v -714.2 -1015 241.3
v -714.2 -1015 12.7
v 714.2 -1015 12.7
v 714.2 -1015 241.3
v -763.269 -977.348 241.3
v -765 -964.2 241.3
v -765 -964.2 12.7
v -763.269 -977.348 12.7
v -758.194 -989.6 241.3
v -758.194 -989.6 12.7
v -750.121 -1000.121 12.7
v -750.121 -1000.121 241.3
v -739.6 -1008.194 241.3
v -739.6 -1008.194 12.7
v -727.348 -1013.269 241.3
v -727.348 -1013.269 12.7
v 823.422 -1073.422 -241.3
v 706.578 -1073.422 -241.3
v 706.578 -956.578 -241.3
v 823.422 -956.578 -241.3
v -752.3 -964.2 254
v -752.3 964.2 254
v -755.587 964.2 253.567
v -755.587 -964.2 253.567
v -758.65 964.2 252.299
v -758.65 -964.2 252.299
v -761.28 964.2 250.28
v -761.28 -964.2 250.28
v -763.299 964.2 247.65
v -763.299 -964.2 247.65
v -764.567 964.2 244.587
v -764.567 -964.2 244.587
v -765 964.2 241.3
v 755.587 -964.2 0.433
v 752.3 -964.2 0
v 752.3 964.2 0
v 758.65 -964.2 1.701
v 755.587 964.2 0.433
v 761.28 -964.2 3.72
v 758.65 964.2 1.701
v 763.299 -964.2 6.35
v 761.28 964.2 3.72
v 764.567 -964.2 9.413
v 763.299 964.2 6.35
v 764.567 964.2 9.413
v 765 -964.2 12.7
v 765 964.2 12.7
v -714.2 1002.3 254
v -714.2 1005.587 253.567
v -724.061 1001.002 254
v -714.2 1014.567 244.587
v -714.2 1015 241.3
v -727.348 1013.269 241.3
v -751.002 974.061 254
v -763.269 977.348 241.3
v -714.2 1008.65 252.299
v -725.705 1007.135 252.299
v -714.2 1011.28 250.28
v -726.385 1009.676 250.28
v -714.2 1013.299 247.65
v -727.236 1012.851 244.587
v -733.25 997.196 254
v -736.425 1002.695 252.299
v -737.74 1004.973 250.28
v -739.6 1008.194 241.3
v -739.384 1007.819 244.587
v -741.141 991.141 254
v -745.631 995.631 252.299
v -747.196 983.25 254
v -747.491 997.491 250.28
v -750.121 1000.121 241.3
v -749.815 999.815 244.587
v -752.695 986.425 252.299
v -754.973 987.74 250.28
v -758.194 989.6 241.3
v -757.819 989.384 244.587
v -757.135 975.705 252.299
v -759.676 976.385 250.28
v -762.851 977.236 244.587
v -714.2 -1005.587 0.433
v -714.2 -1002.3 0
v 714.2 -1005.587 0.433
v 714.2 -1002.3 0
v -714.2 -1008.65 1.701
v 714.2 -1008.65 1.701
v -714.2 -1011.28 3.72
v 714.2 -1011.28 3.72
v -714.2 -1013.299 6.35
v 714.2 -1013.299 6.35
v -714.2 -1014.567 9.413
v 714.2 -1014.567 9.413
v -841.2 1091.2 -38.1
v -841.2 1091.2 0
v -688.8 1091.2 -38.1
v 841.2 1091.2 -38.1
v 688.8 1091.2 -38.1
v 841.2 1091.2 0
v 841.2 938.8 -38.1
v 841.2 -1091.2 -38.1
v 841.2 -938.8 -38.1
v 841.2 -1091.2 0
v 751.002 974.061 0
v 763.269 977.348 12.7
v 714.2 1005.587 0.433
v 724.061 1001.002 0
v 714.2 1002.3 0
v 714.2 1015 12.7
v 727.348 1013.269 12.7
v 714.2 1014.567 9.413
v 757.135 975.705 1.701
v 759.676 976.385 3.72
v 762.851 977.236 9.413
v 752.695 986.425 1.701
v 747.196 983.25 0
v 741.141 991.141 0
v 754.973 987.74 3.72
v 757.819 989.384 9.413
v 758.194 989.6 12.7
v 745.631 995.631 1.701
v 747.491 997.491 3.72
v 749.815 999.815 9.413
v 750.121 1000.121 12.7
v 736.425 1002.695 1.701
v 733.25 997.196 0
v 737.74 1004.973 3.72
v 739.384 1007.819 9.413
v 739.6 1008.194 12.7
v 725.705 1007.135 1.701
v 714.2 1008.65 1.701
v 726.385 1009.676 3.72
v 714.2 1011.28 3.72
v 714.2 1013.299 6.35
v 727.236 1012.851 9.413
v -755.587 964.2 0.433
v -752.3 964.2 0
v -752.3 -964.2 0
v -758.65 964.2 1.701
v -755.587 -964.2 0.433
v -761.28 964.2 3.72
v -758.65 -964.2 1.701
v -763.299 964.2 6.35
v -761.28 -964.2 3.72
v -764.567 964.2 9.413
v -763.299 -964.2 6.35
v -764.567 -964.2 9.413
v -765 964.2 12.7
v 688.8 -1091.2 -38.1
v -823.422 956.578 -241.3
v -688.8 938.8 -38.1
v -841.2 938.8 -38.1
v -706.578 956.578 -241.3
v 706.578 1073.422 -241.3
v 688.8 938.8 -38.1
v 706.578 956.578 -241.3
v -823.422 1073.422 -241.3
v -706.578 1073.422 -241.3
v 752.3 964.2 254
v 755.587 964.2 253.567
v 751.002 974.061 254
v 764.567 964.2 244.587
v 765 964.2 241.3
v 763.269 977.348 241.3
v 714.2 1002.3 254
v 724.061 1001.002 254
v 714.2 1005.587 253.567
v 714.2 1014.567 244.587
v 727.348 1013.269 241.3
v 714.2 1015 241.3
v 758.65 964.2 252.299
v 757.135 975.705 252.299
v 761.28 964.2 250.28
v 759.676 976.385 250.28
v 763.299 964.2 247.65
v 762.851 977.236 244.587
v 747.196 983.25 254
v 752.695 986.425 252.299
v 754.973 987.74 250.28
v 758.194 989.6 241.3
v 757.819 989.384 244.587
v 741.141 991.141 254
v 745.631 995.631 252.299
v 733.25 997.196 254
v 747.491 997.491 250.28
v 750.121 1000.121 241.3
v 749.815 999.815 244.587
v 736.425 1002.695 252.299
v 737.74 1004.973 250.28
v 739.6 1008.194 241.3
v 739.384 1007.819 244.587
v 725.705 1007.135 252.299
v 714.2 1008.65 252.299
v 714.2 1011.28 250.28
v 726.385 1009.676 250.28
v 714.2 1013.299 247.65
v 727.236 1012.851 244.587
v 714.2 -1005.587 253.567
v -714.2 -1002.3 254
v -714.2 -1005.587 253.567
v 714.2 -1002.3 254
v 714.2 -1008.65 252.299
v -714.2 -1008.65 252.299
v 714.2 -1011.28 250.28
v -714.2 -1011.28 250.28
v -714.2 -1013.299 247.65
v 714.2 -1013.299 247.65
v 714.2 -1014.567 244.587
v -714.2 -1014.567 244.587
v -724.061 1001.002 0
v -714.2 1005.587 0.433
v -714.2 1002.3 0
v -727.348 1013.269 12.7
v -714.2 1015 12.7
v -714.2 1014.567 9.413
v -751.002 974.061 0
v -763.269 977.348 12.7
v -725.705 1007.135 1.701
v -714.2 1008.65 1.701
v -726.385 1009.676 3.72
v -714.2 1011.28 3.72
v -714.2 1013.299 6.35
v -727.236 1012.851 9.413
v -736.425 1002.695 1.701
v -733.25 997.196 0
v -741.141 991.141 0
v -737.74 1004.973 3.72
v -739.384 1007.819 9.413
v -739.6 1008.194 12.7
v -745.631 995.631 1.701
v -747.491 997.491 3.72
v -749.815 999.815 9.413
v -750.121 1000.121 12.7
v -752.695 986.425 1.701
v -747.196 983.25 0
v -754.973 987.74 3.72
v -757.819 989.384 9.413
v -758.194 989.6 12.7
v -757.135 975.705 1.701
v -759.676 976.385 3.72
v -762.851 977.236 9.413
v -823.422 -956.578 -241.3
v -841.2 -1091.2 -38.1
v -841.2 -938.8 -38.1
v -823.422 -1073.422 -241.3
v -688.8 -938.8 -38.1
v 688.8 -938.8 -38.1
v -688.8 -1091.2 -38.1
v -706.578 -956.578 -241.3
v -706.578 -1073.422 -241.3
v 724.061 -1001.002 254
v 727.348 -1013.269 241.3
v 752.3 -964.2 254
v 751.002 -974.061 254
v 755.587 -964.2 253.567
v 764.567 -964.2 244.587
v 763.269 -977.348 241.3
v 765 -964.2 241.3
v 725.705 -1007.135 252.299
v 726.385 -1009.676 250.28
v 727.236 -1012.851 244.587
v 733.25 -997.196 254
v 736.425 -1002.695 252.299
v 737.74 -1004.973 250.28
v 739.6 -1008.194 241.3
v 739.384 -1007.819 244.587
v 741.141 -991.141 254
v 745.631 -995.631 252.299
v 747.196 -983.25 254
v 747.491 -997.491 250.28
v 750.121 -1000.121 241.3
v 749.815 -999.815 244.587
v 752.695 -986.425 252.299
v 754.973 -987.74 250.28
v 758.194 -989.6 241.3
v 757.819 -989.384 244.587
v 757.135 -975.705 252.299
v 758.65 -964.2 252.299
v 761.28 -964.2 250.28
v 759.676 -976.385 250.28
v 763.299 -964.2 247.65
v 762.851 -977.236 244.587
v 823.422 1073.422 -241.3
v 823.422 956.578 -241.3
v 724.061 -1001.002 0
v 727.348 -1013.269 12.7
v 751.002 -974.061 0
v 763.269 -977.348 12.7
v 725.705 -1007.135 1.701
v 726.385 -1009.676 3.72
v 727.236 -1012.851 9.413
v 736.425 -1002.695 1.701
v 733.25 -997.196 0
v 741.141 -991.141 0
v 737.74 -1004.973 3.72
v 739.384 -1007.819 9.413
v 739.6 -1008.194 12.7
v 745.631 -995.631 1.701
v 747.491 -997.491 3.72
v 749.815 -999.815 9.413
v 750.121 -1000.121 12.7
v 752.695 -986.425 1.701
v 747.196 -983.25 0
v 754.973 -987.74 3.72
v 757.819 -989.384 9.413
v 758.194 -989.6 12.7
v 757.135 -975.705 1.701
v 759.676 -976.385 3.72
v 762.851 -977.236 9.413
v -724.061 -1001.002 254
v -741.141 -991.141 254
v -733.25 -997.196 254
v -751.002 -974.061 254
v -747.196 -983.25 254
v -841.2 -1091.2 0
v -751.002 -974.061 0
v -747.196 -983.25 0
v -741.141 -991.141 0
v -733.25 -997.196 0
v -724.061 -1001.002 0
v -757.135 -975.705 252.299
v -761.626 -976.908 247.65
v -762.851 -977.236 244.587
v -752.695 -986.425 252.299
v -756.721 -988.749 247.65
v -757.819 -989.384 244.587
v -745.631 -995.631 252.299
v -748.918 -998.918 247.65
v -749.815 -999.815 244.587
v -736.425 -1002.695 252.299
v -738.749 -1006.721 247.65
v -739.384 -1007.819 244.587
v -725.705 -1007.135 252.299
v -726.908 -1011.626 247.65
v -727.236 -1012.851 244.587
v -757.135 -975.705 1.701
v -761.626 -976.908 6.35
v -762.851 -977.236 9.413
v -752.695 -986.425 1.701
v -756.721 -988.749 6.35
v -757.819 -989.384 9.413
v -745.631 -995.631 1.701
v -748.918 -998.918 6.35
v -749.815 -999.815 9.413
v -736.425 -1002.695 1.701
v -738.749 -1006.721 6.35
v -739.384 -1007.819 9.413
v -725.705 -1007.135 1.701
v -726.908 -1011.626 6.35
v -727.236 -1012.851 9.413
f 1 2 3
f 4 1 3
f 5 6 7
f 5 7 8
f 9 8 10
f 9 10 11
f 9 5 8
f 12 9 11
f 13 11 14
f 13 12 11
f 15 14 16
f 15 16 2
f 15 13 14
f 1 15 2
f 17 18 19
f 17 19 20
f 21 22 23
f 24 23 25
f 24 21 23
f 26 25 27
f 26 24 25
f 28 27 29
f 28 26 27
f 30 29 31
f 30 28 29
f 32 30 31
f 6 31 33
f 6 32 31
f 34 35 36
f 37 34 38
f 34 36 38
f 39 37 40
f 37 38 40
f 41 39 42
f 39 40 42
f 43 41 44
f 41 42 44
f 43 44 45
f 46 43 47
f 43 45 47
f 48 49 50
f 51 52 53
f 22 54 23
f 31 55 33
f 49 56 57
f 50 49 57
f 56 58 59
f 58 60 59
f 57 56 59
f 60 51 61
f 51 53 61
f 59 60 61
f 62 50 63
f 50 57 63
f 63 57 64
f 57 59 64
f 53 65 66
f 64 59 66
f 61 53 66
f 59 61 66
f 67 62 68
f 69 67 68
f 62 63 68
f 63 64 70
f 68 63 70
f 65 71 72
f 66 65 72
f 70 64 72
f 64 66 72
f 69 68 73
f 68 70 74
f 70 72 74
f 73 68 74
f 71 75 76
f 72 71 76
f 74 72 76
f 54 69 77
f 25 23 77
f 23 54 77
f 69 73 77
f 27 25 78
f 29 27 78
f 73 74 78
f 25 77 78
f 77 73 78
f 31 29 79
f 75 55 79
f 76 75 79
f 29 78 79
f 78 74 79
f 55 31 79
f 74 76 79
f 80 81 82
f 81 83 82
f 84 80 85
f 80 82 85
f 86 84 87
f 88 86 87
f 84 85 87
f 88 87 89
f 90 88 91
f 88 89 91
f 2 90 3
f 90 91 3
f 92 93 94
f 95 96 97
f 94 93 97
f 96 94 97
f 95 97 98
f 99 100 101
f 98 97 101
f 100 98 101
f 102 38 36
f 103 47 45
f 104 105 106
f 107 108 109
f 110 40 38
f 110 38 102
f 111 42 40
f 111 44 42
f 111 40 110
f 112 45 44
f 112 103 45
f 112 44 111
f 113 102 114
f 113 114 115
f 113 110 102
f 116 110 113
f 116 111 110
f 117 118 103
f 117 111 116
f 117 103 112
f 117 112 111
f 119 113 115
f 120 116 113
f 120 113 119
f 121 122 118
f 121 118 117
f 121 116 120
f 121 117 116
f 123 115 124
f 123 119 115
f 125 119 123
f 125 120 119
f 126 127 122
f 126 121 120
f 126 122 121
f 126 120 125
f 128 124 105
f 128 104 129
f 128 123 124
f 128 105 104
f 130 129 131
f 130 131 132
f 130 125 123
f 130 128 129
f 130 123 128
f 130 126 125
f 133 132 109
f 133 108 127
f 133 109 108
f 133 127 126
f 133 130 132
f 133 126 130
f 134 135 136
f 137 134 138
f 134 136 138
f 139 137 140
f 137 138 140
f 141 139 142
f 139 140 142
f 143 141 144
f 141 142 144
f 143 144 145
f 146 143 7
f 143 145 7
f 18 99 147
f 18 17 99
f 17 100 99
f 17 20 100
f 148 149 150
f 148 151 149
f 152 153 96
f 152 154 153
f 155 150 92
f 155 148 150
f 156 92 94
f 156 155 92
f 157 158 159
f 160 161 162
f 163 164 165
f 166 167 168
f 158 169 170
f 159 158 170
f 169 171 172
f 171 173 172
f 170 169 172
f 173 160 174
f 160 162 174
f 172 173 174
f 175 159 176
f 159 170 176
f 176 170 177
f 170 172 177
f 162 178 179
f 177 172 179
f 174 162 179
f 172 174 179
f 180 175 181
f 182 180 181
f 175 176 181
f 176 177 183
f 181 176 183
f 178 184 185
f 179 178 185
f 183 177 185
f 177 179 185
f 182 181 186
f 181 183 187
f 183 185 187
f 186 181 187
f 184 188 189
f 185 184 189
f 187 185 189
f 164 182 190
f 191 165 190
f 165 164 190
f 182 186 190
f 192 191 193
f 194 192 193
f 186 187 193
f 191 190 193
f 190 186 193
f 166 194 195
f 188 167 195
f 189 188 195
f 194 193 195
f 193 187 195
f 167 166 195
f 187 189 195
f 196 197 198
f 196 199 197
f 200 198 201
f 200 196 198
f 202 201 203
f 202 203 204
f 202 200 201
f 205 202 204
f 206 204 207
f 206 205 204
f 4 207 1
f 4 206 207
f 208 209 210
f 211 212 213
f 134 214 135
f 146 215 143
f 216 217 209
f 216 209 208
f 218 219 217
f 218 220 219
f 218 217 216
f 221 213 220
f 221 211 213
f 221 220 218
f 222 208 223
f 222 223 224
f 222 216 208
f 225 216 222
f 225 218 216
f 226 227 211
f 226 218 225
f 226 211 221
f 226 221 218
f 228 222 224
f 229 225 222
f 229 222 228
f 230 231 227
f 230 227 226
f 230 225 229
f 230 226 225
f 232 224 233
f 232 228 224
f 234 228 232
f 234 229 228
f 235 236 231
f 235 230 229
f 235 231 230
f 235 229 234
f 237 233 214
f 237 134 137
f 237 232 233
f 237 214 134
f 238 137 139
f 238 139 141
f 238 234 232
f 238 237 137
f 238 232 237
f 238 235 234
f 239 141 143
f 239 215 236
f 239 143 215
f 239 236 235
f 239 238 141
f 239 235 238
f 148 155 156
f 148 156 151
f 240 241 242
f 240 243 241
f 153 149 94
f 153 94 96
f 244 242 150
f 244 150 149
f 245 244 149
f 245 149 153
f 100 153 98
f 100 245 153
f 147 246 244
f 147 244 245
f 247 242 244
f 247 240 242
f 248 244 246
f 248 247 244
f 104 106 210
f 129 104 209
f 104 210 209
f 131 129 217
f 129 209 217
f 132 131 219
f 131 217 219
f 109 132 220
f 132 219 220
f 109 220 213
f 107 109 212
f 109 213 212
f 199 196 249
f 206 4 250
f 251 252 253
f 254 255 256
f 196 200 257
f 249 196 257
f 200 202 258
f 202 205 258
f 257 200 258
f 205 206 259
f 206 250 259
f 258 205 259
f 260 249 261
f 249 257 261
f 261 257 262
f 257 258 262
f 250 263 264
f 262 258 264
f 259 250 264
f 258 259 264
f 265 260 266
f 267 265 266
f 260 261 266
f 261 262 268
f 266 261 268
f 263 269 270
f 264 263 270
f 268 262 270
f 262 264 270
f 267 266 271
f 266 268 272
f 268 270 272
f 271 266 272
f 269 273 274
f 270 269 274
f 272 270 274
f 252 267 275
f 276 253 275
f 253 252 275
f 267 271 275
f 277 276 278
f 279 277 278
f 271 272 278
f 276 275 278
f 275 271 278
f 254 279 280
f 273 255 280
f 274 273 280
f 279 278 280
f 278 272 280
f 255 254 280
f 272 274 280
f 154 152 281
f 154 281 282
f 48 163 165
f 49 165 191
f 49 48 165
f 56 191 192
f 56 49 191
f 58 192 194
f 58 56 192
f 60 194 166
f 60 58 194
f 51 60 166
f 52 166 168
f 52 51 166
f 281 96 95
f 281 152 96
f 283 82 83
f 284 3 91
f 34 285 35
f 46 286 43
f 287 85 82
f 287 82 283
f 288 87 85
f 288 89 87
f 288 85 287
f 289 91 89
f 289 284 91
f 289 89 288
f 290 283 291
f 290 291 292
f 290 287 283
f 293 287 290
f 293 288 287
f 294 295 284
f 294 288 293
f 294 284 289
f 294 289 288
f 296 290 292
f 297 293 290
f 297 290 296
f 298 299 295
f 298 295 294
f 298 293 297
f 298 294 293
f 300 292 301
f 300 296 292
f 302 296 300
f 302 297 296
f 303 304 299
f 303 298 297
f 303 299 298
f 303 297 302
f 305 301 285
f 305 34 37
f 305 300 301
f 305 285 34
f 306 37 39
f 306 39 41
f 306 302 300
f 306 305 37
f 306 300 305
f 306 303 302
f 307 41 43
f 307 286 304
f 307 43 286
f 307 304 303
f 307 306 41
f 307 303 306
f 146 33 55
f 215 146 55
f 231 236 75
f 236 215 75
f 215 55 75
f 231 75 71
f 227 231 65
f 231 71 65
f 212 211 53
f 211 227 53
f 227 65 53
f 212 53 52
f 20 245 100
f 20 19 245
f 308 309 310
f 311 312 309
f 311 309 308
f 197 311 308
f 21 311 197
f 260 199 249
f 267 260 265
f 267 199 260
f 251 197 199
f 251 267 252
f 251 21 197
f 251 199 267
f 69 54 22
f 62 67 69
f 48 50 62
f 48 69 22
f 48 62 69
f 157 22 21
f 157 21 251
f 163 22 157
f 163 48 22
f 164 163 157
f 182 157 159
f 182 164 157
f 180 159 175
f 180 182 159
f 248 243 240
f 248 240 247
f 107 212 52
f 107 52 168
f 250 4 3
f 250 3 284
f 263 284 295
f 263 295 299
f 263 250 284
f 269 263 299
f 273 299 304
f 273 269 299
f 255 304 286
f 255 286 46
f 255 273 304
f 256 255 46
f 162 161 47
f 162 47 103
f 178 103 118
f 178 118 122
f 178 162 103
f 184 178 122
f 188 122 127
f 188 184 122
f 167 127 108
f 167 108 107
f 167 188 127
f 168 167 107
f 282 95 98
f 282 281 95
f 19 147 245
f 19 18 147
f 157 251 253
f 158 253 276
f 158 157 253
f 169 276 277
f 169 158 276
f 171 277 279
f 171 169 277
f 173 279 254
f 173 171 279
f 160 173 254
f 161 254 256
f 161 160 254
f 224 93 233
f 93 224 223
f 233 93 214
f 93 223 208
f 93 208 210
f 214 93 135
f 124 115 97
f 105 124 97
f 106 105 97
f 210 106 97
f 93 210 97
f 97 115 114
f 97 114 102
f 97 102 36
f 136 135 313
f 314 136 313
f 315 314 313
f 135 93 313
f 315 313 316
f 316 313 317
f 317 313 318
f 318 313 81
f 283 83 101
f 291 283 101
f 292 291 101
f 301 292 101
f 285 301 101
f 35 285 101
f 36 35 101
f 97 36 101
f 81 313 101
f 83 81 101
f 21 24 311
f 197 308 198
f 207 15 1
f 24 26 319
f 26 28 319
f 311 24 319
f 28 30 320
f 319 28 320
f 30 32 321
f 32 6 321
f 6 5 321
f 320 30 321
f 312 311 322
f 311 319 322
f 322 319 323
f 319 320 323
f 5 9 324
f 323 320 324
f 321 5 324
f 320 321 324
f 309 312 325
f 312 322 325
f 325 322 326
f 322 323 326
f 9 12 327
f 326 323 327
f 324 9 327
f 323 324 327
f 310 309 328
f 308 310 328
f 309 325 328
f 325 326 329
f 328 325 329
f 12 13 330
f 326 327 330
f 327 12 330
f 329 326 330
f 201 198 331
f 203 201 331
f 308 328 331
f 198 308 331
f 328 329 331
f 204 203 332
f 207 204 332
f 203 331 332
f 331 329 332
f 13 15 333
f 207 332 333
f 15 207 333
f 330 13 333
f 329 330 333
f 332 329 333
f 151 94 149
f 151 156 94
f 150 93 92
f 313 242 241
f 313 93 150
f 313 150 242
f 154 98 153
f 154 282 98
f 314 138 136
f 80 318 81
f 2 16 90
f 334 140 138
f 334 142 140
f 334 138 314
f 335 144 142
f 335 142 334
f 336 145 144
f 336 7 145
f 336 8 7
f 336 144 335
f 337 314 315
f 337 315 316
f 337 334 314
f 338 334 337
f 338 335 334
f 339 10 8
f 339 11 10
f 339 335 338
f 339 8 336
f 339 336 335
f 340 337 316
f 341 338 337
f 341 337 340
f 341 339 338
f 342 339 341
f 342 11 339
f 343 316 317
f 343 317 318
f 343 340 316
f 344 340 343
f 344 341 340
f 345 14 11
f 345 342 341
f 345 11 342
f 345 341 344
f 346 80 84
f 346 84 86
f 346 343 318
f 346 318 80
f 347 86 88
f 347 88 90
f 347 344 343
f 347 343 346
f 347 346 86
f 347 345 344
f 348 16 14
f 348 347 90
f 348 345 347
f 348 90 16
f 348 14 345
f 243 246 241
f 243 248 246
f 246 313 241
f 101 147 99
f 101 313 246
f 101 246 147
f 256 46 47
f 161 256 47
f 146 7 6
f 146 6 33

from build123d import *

# Parameters (mm, degrees)
F0_W     = 1530
F0_H     = 2030
F1_DEPTH = 254
F2_R     = 50.8
F3_R     = 12.7
F4_W     = 1682.4
F4_H     = 2182.4
F5_DEPTH = 38.1
F6_W     = 152.4
F6_H     = 152.4
F7_DEPTH = 203.2
F7_TAPER = 5


with BuildPart() as f1:
    # F0 (on Top) → F1 (new body)
    with BuildSketch(Plane.XY):
        Rectangle(F0_W, F0_H)
    extrude(amount=F1_DEPTH)

    # F2
    f2_edges = [f1.edges().sort_by_distance(p)[0] for p in [
        (-765, -1015, 127),
        (765, -1015, 127),
        (765, 1015, 127),
        (-765, 1015, 127),
    ]]
    fillet(f2_edges, radius=F2_R)

    # F3
    f3_edges = [f1.edges().sort_by_distance(p)[0] for p in [
        (0, -1015, 254),
        (-750.121024, -1000.121024, 254),
        (750.121024, -1000.121024, 254),
        (-765, 0, 254),
        (765, 0, 254),
        (-750.121024, 1000.121024, 254),
        (750.121024, 1000.121024, 254),
        (0, 1015, 254),
        (0, -1015, 0),
        (-750.121024, -1000.121024, 0),
        (750.121024, -1000.121024, 0),
        (-765, 0, 0),
        (765, 0, 0),
        (-750.121024, 1000.121024, 0),
        (750.121024, 1000.121024, 0),
        (0, 1015, 0),
    ]]
    fillet(f3_edges, radius=F3_R)

    # F4 (on face) → F5 (join)
    with BuildSketch(Plane(origin=(0, 0, 0), x_dir=(1, 0, 0), z_dir=(0, 0, -1))):
        Rectangle(F4_W, F4_H)
    extrude(amount=F5_DEPTH)

    # F6 (on face) → F7 (join)
    with BuildSketch(Plane(origin=(0, 0, -38.1), x_dir=(1, 0, 0), z_dir=(0, 0, -1))):
        with Locations((-765, 1015)):
            Rectangle(F6_W, F6_H)
        with Locations((765, 1015)):
            Rectangle(F6_W, F6_H)
        with Locations((765, -1015)):
            Rectangle(F6_W, F6_H)
        with Locations((-765, -1015)):
            Rectangle(F6_W, F6_H)
    extrude(amount=F7_DEPTH, taper=F7_TAPER)


solid = f1.part
